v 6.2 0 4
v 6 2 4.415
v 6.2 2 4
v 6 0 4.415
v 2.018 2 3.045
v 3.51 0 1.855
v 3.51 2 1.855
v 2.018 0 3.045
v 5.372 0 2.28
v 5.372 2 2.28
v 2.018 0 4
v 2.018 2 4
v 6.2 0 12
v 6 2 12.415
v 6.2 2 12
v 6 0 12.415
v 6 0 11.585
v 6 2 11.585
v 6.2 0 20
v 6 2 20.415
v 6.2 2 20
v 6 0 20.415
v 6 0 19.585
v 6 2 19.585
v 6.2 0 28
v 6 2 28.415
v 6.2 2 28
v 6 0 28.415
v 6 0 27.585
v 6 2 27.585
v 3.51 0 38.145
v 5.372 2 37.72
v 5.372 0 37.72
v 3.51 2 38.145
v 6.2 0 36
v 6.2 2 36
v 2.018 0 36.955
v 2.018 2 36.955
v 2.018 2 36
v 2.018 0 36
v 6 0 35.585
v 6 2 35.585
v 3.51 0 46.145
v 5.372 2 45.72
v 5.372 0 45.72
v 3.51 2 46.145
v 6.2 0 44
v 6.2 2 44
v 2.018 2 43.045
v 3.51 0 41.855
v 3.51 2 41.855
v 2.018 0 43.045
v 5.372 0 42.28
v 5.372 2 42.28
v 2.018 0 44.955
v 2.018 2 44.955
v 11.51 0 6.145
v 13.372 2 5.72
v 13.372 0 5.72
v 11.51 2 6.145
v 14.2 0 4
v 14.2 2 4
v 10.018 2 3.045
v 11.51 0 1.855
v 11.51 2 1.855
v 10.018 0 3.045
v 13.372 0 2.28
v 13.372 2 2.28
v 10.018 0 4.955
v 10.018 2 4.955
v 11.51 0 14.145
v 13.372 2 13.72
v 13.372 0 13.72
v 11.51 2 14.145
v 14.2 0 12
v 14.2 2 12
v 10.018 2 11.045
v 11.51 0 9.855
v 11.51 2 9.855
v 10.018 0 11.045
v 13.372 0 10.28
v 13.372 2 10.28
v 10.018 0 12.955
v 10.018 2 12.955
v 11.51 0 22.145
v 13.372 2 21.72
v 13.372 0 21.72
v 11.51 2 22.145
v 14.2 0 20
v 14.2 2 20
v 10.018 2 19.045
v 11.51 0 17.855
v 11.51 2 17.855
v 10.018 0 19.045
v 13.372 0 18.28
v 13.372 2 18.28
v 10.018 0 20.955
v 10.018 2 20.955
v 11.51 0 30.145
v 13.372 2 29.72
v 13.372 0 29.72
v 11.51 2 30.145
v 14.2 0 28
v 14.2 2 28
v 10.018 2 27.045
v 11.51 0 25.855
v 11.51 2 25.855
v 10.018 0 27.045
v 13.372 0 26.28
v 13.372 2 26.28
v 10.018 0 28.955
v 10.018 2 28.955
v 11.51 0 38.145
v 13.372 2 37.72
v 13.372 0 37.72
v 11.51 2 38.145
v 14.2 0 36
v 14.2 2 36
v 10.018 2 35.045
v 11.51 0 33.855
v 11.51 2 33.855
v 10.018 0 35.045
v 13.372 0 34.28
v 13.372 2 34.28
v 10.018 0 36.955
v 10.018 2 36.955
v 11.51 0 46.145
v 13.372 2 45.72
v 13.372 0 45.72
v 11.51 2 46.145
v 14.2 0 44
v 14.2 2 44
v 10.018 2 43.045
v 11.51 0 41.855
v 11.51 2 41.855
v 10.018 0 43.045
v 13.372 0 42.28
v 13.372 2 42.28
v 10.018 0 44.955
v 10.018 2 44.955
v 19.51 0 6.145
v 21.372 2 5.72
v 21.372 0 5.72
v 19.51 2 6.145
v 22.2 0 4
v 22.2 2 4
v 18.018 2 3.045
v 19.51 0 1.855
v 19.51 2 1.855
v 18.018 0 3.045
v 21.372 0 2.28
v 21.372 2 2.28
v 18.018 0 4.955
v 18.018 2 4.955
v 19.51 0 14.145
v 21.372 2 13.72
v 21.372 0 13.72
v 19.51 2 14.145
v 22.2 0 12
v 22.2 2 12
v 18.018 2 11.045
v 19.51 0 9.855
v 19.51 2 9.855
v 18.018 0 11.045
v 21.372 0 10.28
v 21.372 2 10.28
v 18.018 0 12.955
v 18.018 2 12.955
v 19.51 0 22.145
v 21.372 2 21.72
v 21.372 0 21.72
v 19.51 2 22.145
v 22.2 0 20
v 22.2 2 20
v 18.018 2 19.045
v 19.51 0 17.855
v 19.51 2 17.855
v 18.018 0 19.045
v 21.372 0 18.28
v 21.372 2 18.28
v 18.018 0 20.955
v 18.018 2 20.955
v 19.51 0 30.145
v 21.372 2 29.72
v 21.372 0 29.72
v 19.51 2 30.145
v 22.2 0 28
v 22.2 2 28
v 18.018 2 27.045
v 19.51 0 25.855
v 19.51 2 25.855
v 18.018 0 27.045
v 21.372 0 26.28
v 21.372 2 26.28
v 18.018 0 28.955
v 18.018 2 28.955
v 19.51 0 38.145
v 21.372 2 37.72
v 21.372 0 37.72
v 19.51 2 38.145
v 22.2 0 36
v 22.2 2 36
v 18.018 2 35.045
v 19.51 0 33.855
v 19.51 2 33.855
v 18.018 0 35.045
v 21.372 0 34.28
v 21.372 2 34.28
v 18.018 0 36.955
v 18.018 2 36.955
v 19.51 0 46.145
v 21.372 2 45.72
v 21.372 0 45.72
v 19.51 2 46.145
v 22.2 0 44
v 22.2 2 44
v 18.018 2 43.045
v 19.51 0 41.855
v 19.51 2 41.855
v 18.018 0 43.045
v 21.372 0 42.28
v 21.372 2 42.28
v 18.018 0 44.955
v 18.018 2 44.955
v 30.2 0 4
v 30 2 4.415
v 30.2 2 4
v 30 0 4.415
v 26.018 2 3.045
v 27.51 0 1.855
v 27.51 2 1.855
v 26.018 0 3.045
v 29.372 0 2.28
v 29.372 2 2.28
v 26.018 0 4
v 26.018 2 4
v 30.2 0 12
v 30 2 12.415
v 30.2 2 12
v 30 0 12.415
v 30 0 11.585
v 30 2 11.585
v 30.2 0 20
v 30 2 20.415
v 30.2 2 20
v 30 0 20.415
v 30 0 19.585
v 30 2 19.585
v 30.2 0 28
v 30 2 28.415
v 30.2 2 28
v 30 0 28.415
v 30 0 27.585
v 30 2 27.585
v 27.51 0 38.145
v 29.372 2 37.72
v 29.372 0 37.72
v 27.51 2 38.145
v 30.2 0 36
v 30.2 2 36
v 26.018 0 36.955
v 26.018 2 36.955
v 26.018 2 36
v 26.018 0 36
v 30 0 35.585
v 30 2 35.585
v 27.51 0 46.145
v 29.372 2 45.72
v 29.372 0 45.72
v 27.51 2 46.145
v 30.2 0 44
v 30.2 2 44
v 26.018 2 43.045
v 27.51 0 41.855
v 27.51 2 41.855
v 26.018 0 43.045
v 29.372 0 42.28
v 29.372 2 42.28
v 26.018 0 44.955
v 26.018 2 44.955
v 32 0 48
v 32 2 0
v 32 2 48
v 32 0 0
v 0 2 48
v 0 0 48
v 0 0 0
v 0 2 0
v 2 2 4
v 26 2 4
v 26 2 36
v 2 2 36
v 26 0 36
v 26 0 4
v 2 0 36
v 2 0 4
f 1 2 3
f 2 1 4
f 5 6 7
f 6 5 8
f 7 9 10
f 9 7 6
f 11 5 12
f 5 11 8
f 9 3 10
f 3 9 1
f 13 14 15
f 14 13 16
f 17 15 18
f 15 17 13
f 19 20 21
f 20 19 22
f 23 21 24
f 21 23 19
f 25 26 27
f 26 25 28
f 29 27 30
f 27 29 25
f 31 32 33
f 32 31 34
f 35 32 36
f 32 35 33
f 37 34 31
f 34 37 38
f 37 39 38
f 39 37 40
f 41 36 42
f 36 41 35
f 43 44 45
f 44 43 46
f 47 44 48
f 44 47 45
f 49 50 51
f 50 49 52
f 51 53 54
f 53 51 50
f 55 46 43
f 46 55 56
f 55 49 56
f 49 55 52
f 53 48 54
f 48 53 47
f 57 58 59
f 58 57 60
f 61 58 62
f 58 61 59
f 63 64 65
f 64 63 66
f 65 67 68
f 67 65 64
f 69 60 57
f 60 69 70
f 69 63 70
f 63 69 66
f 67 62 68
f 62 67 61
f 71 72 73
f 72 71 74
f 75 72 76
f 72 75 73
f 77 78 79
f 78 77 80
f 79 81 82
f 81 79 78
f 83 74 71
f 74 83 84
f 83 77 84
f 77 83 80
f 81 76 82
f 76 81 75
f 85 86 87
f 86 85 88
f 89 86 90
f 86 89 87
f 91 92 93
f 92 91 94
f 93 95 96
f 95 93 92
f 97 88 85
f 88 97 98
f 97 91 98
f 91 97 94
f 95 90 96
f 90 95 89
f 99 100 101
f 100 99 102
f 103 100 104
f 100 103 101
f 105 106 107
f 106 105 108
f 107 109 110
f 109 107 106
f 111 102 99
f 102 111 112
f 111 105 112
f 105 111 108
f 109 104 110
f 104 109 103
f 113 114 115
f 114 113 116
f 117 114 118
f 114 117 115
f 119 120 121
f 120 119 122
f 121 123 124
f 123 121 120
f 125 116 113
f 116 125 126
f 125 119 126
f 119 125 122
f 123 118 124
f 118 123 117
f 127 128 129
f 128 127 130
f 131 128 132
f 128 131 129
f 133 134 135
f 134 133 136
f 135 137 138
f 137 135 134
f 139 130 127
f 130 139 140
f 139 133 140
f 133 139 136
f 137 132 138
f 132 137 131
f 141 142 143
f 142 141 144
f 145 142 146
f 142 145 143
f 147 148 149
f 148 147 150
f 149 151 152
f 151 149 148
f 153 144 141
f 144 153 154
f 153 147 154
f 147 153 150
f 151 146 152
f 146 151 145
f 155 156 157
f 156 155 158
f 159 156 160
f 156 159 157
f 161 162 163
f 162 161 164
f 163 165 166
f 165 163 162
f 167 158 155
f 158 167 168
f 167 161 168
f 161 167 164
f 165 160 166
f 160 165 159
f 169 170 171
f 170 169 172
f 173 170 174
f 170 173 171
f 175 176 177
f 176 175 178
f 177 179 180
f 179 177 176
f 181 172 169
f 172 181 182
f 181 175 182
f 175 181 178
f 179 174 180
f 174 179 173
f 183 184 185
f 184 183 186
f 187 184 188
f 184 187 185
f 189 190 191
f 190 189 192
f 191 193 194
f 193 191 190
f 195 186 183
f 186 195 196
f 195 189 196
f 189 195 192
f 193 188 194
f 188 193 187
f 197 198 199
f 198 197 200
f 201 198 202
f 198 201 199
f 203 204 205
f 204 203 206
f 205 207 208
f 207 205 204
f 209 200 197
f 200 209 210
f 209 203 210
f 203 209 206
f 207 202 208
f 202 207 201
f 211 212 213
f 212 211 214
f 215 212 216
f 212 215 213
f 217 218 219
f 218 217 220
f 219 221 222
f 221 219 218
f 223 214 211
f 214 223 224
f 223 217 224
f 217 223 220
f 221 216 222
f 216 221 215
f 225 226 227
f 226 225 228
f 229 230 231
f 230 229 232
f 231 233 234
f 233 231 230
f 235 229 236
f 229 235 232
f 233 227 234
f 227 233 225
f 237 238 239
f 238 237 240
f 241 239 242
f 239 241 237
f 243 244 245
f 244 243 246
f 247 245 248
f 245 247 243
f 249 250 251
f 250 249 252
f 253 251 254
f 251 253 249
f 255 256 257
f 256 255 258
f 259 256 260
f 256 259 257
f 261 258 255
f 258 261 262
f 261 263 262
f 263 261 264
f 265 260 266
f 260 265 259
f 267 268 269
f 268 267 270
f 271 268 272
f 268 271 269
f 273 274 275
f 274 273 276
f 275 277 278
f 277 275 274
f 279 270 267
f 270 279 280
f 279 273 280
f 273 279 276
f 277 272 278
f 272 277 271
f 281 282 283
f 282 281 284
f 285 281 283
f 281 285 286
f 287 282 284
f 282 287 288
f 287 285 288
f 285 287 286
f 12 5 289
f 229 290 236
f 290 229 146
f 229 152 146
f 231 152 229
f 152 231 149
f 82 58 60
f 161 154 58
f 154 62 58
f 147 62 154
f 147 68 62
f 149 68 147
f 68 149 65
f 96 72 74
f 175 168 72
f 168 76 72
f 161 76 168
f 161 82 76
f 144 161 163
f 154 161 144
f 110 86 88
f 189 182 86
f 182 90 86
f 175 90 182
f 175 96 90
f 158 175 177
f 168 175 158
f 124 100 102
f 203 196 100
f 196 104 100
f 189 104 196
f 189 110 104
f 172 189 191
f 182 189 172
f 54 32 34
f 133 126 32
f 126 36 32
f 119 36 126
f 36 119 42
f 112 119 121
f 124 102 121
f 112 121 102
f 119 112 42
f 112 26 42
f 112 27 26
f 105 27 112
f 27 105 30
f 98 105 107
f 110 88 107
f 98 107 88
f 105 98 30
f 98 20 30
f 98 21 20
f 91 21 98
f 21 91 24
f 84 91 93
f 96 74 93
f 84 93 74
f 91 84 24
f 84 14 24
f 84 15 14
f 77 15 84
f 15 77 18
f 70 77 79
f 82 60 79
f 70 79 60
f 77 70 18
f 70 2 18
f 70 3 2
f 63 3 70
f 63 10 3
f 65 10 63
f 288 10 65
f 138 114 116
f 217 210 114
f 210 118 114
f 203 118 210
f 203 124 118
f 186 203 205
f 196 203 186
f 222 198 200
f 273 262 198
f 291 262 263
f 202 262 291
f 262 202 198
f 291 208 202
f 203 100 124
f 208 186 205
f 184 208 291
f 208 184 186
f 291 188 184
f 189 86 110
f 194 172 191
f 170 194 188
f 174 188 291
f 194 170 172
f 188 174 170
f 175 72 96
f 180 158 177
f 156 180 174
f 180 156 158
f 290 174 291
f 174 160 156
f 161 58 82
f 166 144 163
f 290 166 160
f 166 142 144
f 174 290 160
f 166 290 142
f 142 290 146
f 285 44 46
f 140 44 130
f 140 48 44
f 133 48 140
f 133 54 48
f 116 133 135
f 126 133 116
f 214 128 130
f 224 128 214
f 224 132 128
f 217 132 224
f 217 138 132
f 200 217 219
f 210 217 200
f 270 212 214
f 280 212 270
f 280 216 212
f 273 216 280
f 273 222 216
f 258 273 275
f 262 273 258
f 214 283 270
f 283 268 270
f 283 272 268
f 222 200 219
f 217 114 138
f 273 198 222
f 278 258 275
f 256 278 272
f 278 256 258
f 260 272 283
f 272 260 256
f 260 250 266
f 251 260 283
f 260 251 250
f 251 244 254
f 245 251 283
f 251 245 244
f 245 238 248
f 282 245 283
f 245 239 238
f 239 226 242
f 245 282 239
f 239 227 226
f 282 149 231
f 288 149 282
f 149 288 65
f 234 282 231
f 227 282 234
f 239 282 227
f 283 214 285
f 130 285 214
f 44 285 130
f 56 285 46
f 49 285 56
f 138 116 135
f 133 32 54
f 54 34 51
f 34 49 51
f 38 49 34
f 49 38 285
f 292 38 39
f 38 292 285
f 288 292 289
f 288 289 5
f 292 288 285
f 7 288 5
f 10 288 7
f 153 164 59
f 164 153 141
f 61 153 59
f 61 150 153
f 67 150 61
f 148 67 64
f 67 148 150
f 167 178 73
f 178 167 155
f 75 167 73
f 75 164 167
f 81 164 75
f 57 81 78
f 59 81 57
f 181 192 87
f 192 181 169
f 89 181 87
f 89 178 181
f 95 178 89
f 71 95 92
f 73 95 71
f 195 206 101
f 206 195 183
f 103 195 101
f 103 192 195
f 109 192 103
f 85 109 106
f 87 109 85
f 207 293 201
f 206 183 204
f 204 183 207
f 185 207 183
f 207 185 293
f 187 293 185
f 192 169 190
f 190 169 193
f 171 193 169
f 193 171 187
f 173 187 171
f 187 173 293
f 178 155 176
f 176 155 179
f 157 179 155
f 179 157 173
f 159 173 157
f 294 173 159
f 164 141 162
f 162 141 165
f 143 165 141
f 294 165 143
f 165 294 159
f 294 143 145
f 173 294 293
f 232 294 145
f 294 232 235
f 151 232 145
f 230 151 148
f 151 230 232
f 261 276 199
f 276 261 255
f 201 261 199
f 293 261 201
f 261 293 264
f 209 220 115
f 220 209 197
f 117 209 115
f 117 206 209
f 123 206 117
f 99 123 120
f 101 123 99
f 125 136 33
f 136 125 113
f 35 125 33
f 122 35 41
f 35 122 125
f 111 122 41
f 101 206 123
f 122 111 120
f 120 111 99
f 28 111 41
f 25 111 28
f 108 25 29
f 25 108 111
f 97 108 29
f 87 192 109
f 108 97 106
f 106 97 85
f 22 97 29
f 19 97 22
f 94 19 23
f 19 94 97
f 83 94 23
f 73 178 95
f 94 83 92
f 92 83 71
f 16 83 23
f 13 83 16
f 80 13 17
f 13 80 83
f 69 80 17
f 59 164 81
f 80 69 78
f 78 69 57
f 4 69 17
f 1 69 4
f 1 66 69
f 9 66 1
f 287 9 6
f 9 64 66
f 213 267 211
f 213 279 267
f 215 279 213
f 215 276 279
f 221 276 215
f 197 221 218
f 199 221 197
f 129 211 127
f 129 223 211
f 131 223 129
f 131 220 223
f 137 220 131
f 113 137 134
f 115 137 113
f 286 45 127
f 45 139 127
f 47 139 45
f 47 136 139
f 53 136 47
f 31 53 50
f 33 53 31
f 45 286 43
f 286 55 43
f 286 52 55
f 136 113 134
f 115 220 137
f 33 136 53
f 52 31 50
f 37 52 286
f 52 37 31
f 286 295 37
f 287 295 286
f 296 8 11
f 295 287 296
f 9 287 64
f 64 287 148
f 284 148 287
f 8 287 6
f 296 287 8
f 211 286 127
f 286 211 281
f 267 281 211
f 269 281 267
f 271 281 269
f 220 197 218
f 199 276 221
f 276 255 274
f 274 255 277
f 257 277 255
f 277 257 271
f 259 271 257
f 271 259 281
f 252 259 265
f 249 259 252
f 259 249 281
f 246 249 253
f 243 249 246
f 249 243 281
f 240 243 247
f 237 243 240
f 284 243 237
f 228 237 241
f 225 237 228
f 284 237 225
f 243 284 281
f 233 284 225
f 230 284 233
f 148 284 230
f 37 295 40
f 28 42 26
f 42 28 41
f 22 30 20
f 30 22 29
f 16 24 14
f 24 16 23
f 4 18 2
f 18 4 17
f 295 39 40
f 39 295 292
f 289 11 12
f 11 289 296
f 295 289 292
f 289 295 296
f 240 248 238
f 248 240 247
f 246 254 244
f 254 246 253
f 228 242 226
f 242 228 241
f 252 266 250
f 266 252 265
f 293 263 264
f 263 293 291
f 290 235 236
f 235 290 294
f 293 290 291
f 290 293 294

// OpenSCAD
// configuration
space = 4;
hole = 4;
pad = space / 2;

width = 4;
height = 6;
thickness = 2;

difference(){

    cube([
        width*hole + (width-1)*space + 2*pad,
        thickness,
        height*hole + (height-1)*space + 2*pad
    ]);

    for(i=[1:width]) {
        for(j=[1:height]) {
            translate([
                i*hole + (i-1)*space -hole/2 + pad,
                0,
                j*hole + (j-1)*space - hole/2 + pad
            ]) {
                rotate([90, 0, 0]) {
                    translate([0, 0, -2*thickness]) {
                        cylinder(r = hole/2 + 0.2, h = 3*thickness);
                    }
                }
            }
        }
    }

    translate([pad, -thickness, pad + hole/2]) {
        cube([hole, 3*thickness, (height-2)*hole + (height-2)*space]);
    }

    translate([(width - 1)*hole + (width-1)*space + pad, -thickness, pad + hole/2]) {
        cube([hole, 3*thickness, (height-2)*hole + (height-2)*space]);
    }

}
